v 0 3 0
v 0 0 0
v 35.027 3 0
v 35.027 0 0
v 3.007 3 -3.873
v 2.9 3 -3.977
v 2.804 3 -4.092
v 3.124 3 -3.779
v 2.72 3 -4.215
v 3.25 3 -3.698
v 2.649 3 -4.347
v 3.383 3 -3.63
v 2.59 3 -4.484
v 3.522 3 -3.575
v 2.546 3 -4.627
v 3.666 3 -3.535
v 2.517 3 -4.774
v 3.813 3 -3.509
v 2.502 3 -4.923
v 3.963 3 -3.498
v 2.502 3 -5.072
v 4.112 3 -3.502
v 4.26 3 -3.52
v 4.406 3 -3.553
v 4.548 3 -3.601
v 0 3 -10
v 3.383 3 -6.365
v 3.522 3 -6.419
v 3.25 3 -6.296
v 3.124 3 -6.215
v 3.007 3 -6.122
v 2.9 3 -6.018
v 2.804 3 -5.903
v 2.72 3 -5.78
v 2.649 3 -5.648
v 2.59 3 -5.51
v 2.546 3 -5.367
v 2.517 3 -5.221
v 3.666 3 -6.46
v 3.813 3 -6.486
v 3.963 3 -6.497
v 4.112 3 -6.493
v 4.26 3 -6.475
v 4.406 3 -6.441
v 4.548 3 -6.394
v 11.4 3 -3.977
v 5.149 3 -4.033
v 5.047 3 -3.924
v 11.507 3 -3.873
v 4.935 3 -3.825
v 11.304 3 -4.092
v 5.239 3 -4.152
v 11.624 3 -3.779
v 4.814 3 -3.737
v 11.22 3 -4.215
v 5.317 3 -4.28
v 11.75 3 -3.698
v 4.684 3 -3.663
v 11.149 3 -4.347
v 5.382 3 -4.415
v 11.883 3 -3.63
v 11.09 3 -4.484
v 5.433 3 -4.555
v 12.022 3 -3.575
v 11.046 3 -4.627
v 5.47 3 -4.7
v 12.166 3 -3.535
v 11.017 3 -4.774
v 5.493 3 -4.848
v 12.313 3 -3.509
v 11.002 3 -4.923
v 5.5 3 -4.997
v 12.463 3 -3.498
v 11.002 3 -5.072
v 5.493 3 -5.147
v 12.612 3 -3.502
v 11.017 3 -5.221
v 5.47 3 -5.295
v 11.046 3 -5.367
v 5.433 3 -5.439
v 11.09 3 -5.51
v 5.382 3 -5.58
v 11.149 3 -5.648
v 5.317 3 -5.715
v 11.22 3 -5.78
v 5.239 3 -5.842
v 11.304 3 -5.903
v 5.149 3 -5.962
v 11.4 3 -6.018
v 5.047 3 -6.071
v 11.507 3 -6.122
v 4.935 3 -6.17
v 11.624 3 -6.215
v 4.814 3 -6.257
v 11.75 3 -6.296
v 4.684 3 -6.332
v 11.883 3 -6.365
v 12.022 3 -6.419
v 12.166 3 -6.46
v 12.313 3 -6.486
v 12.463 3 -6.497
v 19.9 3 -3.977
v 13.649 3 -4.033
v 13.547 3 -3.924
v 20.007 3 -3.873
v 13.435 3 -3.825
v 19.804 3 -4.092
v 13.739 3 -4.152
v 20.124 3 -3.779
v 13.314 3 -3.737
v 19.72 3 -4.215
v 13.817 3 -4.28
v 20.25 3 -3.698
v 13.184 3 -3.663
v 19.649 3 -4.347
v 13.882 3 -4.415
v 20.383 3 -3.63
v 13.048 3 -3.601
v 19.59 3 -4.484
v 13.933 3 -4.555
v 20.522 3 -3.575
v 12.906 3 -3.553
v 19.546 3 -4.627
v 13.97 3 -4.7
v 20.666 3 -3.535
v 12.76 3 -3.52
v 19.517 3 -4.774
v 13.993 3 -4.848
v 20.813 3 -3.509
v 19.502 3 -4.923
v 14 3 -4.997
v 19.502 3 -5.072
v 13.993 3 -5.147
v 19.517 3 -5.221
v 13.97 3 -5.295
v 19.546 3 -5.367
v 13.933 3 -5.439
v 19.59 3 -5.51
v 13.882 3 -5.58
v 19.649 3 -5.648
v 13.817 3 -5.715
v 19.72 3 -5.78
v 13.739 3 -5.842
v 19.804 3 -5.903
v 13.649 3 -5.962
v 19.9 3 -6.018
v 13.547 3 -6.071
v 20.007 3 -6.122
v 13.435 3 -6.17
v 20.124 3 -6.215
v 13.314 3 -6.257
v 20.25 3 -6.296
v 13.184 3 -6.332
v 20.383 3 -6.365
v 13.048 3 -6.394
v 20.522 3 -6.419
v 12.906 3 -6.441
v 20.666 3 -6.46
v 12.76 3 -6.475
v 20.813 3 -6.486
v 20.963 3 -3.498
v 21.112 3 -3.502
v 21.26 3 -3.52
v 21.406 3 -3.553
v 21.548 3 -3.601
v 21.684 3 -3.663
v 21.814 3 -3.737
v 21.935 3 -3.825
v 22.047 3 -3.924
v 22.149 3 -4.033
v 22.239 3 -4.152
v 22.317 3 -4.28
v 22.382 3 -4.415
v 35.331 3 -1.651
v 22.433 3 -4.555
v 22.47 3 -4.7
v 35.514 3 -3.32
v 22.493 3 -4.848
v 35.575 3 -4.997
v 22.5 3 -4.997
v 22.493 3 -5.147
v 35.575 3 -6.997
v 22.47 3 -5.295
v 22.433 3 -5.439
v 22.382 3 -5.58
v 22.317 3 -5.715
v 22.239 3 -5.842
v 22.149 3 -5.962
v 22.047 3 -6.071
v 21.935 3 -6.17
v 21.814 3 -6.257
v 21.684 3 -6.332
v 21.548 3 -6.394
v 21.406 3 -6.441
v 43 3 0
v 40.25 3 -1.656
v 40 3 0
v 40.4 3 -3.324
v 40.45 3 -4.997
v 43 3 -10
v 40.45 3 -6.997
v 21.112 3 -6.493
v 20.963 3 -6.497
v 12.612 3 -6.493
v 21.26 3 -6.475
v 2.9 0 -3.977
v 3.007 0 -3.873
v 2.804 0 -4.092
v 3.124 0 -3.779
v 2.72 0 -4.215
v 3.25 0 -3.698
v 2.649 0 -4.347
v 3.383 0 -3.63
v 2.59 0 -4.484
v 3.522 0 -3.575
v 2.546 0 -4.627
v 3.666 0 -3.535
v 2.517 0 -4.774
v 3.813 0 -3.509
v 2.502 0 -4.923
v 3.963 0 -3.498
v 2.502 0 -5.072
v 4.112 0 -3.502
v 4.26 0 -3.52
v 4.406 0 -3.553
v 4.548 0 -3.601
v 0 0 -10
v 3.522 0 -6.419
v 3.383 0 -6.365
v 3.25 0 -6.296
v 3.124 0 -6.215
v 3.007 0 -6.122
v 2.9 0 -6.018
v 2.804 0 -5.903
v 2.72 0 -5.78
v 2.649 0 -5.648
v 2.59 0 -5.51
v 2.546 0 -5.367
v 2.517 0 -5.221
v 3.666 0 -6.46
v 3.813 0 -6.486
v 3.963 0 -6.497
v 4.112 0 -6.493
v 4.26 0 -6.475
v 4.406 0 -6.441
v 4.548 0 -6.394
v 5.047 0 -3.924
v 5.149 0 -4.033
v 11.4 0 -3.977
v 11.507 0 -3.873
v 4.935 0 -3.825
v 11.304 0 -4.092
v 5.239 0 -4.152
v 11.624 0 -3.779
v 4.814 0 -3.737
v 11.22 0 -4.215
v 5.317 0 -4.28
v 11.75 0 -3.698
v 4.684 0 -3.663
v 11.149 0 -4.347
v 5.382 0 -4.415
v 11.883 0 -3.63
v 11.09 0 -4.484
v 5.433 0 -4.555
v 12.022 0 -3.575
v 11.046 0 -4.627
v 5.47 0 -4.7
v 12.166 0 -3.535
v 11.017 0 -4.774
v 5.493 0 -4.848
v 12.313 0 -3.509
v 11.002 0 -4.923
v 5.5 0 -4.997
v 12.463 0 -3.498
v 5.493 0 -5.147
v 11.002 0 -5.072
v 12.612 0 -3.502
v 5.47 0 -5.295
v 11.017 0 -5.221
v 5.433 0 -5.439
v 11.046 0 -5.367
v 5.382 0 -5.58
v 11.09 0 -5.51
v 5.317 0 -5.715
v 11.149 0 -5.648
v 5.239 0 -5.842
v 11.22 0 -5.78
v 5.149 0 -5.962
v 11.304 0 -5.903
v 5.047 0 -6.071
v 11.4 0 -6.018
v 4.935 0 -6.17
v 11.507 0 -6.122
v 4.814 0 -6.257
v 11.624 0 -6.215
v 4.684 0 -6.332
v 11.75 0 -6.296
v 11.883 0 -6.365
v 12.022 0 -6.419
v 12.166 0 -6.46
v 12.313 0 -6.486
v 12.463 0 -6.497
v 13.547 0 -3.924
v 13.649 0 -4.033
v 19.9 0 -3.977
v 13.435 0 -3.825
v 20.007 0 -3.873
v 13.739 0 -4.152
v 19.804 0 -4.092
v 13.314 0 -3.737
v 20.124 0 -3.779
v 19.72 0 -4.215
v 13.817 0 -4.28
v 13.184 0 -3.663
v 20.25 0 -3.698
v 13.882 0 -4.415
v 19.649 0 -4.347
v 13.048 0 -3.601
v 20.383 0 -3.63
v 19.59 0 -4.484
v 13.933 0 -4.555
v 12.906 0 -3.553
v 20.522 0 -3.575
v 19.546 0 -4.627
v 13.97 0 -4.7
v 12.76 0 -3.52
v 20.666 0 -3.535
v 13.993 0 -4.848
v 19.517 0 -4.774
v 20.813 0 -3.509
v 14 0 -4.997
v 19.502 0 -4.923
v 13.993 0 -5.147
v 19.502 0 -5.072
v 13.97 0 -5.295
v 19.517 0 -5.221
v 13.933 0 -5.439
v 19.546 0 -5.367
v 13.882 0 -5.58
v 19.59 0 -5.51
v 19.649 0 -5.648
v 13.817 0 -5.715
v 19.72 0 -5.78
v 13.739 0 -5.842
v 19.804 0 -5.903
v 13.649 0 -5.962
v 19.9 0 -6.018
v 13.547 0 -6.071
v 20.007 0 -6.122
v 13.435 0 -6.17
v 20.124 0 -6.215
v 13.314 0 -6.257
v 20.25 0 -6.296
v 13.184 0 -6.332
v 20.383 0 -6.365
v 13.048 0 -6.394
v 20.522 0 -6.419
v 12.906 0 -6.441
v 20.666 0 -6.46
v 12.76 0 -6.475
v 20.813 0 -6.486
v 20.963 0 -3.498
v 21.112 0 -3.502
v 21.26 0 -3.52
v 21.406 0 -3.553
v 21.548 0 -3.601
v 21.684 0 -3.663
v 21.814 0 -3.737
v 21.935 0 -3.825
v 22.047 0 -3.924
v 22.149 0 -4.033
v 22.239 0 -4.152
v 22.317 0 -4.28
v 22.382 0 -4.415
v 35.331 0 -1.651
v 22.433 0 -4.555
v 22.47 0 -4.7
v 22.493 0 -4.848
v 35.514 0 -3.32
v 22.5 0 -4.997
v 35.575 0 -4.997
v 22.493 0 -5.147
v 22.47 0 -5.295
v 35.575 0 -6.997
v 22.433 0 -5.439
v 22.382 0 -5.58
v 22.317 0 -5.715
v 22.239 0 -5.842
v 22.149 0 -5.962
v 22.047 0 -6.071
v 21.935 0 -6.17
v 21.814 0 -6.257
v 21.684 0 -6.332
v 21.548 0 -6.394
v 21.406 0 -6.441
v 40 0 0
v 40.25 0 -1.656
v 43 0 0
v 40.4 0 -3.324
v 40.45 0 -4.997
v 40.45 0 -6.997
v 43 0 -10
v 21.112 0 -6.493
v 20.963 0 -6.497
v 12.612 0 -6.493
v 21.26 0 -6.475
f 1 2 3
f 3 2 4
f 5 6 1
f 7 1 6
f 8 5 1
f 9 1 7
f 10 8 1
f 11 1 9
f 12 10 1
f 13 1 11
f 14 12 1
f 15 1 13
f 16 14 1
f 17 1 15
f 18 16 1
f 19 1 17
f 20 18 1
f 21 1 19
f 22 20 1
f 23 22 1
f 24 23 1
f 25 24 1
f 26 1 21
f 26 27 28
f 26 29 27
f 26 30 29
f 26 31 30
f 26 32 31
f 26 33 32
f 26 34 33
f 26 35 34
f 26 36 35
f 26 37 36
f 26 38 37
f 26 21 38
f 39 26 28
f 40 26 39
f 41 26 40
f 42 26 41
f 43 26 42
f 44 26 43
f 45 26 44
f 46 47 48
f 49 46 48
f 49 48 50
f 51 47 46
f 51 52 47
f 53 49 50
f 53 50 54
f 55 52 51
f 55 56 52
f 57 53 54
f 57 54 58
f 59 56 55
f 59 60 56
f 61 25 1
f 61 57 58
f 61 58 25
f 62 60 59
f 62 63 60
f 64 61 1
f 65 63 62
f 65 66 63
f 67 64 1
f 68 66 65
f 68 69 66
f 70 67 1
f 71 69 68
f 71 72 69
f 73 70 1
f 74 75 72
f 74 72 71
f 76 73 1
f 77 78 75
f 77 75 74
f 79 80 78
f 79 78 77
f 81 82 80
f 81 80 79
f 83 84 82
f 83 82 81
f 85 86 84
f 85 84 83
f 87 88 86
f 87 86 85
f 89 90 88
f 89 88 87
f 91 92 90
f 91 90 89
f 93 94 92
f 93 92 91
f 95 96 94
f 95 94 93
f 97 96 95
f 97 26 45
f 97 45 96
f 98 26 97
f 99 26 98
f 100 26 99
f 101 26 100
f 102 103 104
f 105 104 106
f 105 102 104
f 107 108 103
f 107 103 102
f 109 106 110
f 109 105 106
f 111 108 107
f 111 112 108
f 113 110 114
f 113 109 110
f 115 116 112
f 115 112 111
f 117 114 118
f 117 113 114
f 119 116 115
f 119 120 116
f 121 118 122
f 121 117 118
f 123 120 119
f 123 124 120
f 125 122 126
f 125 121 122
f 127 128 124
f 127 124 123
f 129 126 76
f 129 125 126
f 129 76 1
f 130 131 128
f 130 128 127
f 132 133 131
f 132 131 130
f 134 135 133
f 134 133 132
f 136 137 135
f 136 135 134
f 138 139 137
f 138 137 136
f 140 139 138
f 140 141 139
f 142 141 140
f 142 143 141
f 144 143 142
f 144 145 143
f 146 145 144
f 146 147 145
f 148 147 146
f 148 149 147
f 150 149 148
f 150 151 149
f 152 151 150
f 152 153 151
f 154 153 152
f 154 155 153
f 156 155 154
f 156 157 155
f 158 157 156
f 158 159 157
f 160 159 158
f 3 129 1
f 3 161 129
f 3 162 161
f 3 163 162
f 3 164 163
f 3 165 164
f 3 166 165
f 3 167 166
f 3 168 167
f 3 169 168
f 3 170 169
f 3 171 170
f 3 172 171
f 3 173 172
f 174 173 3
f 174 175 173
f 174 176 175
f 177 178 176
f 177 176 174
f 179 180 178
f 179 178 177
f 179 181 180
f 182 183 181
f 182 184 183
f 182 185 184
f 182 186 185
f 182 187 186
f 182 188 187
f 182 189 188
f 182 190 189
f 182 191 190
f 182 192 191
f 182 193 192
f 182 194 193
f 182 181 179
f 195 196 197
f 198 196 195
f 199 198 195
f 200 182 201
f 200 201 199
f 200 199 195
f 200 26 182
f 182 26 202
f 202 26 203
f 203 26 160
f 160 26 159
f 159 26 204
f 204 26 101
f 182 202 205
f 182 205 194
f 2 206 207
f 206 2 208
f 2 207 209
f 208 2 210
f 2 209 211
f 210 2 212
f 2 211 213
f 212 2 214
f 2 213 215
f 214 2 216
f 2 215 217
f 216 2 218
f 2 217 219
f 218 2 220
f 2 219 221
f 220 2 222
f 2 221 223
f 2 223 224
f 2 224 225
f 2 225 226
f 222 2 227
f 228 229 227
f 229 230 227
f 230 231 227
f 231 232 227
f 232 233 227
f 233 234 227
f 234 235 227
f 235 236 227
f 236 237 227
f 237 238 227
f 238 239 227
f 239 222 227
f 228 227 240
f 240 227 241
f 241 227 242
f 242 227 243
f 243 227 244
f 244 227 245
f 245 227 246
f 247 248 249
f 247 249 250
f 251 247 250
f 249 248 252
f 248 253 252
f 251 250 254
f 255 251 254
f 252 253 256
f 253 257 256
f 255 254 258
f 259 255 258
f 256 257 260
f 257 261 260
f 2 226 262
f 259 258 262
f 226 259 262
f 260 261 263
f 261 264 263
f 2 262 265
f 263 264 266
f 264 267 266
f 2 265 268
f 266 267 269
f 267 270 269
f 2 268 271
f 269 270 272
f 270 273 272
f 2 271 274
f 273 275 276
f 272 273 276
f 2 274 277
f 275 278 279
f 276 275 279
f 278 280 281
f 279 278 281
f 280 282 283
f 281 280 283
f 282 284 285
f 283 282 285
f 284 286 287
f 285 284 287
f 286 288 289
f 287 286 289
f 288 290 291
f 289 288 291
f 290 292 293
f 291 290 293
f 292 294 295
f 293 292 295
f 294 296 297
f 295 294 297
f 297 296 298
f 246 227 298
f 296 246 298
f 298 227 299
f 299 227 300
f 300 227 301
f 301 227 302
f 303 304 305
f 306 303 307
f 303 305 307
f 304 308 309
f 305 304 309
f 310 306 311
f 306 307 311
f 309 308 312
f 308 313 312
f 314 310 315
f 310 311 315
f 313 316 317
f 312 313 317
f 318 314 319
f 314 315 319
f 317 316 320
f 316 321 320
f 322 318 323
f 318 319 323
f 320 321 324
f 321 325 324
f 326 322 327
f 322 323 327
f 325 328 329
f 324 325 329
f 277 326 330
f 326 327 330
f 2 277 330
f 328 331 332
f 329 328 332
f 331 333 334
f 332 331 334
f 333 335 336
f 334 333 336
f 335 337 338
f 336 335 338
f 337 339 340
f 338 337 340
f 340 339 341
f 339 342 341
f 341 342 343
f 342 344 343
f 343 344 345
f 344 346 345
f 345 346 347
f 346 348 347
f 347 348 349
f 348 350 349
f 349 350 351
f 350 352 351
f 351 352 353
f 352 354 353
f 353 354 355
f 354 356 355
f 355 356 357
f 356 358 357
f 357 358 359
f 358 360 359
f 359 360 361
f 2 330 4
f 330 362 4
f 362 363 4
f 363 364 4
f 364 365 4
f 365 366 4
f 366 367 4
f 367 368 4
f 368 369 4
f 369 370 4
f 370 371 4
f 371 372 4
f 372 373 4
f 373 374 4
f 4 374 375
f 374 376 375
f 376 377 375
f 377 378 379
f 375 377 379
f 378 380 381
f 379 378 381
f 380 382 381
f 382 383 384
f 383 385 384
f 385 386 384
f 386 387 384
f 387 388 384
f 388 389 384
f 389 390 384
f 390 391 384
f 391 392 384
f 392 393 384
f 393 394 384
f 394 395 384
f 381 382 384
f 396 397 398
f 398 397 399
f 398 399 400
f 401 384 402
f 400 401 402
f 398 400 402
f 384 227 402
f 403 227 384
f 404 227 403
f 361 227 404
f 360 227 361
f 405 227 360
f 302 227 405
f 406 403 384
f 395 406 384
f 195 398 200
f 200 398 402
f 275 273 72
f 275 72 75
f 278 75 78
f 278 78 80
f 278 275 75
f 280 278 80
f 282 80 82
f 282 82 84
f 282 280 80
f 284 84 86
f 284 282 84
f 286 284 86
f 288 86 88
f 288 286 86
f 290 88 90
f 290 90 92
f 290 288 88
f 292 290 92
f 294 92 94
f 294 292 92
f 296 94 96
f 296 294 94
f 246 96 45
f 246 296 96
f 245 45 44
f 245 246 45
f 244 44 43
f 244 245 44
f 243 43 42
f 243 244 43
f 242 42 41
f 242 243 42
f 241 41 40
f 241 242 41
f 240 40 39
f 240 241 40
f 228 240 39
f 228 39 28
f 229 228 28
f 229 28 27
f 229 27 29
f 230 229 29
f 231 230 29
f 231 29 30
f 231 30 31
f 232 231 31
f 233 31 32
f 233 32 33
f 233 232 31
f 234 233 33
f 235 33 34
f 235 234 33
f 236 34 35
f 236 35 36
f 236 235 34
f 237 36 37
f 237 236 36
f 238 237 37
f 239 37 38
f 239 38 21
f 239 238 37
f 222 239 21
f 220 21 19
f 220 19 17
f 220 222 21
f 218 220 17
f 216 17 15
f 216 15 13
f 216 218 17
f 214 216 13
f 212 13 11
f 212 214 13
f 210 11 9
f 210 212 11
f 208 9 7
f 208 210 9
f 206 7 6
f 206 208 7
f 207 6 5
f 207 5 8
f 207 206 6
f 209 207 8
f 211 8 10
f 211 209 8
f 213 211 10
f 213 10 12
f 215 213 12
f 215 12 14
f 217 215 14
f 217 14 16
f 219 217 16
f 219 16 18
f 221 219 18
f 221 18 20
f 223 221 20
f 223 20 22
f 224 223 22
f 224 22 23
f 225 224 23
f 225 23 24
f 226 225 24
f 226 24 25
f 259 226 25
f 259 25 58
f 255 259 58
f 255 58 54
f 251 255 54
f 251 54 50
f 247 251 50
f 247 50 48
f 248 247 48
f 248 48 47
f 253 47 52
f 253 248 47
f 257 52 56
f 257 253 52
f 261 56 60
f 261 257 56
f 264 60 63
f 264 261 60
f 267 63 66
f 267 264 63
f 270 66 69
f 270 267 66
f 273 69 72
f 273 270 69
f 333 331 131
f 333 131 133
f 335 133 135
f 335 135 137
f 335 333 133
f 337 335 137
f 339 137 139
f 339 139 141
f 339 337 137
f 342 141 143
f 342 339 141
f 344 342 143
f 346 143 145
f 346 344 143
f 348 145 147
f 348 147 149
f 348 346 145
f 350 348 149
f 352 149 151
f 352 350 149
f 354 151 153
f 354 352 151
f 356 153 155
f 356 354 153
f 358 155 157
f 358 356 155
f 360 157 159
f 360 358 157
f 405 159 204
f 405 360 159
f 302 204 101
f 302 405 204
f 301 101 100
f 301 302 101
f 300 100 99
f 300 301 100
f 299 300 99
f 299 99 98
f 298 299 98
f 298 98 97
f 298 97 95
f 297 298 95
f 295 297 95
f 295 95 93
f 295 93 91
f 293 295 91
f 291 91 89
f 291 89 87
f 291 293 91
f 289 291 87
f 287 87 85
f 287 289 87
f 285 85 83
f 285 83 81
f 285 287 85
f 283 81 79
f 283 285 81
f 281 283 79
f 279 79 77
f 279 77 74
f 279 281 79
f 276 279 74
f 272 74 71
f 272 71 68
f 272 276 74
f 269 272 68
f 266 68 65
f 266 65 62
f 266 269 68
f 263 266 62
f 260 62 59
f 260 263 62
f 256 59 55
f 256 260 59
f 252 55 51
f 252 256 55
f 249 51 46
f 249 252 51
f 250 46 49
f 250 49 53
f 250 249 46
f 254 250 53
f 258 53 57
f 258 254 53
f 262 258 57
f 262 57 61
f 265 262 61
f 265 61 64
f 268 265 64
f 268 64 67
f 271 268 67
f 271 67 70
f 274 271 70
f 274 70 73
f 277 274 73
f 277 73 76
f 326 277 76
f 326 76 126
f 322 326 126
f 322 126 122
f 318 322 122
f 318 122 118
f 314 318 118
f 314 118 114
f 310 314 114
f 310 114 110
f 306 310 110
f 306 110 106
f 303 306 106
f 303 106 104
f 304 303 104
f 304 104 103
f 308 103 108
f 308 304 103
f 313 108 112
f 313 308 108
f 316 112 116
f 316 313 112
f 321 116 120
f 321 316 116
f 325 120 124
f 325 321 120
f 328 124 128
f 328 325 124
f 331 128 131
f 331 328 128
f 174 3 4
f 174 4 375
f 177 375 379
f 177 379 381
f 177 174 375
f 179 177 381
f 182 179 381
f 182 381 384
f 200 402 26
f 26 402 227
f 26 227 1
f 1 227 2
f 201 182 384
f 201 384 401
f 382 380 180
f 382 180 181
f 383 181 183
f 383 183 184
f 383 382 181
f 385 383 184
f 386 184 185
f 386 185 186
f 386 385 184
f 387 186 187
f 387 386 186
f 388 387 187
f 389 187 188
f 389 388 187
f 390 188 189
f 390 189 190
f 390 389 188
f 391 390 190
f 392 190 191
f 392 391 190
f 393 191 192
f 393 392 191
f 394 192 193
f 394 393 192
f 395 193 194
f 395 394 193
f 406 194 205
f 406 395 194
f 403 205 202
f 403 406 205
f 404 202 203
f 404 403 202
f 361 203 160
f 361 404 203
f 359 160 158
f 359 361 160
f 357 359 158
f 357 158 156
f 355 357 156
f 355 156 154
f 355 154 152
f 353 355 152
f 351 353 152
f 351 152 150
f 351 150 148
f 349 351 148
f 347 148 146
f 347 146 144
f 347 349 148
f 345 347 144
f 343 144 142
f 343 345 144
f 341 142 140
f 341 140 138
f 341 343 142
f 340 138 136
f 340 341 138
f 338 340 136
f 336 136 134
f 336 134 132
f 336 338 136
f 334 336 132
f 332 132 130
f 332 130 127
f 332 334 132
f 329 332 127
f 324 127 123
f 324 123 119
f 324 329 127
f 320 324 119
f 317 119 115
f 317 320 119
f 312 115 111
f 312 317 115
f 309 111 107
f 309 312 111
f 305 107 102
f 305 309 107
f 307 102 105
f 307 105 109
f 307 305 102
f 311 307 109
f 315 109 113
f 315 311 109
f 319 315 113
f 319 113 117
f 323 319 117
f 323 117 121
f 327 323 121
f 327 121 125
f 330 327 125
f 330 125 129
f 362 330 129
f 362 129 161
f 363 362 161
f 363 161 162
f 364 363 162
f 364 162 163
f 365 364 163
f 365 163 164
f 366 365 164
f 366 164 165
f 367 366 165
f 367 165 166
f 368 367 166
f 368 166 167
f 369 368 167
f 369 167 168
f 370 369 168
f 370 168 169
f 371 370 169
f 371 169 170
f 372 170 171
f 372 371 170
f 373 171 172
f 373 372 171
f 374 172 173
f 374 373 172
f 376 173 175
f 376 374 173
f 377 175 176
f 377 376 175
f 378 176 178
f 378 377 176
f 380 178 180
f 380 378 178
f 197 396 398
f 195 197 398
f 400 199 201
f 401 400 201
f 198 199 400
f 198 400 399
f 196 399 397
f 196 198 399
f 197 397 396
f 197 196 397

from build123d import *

# Parameters (mm, degrees)
ESQUISSE1_R             = 1.5
BOSS_EXTRU_2_DEPTH      = 3
ENL_V_MAT_EXTRU_2_DEPTH = 3
ESQUISSE3_W             = 4.875673512
ESQUISSE3_H             = 2
ENL_V_MAT_EXTRU_3_DEPTH = 3


with BuildPart() as part:
    # Esquisse1 → Boss.-Extru.2 (new body)
    with BuildSketch(Plane(origin=(0, 0, 0), x_dir=(1, 0, 0), z_dir=(0, 1, 0))):
        Polygon((0, 0), (36.5, 0), (36.5, 2.820303555), (40, 2.820303555), (40, 0), (43, 0), (43, 10), (0, 10), align=None)
        with Locations((4, 4.99734883)):
            Circle(ESQUISSE1_R, mode=Mode.SUBTRACT)
        with Locations((12.5, 4.99734883)):
            Circle(ESQUISSE1_R, mode=Mode.SUBTRACT)
        with Locations((21, 4.99734883)):
            Circle(ESQUISSE1_R, mode=Mode.SUBTRACT)
    extrude(amount=BOSS_EXTRU_2_DEPTH)

    # Esquisse2 → Enlèv. mat.-Extru.2 (cut)
    with BuildSketch(Plane(origin=(0, 3, 0), x_dir=(1, 0, 0), z_dir=(0, 1, 0))):
        with BuildLine():
            Line((35.602803426, 4.99734883), (40.450375585, 4.99734883))
            ThreePointArc((40.450375585, 4.99734883), (40.337553987, 2.488547647), (40, 0))
            Line((40, 0), (40, 2.820303555))
            Line((40, 2.820303555), (36.5, 2.820303555))
            Line((36.5, 2.820303555), (36.5, 0))
            Line((36.5, 0), (35.02705885, 0))
            ThreePointArc((35.02705885, 0), (35.437382668, 2.483715582), (35.574702073, 4.99734883))
            Line((35.574702073, 4.99734883), (35.602803426, 4.99734883))
        make_face()
    extrude(amount=-ENL_V_MAT_EXTRU_2_DEPTH, mode=Mode.SUBTRACT)

    # Esquisse3 → Enlèv. mat.-Extru.3 (cut)
    with BuildSketch(Plane(origin=(0, 3, 0), x_dir=(1, 0, 0), z_dir=(0, 1, 0))):
        with Locations((38.012538829, 5.99734883)):
            Rectangle(ESQUISSE3_W, ESQUISSE3_H)
    extrude(amount=-ENL_V_MAT_EXTRU_3_DEPTH, mode=Mode.SUBTRACT)


solid = part.part
